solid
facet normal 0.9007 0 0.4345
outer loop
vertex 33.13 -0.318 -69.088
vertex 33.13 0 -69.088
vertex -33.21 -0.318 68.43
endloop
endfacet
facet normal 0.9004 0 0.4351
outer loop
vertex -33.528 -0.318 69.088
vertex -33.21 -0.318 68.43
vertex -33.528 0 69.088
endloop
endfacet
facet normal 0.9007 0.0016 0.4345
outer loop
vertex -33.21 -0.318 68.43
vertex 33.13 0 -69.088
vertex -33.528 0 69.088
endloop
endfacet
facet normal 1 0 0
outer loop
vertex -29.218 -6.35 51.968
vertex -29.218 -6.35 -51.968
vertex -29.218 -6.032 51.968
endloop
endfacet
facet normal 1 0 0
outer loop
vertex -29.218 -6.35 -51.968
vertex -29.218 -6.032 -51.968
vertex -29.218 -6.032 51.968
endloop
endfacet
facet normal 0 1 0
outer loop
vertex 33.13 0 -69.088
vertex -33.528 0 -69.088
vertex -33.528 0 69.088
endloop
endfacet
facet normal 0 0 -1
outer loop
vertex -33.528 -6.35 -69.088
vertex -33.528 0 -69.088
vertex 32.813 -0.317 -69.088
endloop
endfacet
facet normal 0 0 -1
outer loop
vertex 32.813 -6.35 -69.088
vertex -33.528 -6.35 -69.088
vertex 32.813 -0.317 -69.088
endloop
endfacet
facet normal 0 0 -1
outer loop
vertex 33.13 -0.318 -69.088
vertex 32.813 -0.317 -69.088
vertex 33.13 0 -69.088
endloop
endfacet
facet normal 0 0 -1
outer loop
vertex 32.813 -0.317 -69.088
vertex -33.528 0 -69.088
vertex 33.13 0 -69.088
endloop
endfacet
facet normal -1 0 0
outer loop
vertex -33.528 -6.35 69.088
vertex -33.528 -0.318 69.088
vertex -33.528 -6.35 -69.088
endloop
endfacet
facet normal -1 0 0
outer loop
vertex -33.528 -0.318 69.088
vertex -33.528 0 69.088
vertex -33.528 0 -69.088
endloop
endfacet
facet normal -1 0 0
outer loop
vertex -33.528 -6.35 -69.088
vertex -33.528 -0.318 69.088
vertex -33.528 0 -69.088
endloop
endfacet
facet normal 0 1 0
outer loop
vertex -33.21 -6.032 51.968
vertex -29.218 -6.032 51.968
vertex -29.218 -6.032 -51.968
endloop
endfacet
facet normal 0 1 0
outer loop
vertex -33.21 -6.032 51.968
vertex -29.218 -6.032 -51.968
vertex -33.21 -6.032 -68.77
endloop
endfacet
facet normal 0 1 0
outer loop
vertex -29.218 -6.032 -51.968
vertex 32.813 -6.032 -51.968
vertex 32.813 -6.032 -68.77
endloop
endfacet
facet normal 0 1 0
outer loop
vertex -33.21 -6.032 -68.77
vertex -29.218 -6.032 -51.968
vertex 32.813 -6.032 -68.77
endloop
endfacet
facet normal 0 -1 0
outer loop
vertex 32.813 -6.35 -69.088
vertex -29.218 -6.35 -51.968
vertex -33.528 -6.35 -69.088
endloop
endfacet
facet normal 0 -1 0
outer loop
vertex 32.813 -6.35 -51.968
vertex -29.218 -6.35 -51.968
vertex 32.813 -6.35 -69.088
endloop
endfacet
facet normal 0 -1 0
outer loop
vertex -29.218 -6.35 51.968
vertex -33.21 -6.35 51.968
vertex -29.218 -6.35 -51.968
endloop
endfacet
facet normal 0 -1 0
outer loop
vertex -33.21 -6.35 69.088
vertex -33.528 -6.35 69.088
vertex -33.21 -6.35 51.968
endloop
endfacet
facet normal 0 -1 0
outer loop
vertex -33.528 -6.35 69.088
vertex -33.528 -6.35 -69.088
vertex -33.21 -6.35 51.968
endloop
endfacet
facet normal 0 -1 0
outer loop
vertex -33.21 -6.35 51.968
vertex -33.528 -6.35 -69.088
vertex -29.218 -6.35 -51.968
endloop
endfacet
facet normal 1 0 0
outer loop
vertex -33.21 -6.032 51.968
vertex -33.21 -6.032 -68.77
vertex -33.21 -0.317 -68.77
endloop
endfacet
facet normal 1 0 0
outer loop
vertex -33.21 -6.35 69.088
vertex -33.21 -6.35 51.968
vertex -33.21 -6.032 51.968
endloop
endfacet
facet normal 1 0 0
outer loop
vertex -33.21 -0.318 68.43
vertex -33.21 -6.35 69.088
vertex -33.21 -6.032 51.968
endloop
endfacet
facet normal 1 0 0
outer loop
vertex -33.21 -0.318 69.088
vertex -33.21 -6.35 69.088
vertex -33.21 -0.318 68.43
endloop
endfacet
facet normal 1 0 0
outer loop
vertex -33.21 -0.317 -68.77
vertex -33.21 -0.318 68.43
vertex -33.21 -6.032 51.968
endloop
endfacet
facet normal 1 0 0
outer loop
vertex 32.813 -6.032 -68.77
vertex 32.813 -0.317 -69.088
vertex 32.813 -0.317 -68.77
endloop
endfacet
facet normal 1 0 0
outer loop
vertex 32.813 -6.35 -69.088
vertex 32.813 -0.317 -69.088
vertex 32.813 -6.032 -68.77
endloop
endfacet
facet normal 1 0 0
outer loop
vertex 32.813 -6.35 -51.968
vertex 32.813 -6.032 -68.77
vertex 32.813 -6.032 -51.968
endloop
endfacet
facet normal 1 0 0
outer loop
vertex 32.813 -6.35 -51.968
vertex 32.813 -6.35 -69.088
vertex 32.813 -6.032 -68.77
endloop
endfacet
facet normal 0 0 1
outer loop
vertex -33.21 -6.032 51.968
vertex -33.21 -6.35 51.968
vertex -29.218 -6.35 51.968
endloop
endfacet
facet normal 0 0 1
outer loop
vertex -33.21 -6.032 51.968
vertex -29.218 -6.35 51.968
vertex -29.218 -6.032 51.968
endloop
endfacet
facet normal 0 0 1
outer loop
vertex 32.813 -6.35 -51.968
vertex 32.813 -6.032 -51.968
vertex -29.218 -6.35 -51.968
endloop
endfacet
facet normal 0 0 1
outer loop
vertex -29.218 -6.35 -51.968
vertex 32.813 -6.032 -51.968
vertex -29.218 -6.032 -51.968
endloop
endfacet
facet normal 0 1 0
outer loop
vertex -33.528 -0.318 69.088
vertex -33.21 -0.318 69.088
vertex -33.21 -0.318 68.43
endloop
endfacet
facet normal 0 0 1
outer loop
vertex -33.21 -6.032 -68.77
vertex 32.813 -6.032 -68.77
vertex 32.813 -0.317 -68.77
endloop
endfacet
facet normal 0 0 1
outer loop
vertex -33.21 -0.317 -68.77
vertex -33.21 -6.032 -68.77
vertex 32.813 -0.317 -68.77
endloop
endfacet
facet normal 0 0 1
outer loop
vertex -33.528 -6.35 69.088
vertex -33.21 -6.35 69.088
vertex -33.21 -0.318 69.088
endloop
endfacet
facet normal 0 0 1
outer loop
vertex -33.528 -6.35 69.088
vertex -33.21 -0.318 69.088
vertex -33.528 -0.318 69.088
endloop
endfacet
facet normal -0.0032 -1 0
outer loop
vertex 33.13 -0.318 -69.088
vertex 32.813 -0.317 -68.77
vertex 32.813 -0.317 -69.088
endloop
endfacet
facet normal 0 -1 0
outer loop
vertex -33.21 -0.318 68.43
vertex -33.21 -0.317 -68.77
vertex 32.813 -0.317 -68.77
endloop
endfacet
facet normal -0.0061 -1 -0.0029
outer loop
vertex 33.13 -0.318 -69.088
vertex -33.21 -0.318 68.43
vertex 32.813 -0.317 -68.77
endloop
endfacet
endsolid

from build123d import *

# Parameters (mm, degrees)
F1_DEPTH  = 6.35
F2_W      = 5.715
F2_H      = 16.8021
F3_DEPTH  = 33.011516
F4_W      = 3.99288
F4_H      = 5.715
F5_DEPTH  = 68.7705
F6_W      = 0.3175
F6_H      = 138.176
F7_DEPTH  = 63.5
F9_DEPTH  = 25.4
F10_W     = 6.0325
F10_H     = 18.3896
F11_DEPTH = 67.49388
F13_DEPTH = 0.3175
F14_W     = 0.3175
F14_H     = 17.1196
F15_DEPTH = 6.0325


with BuildPart() as f1:
    # F0 (on Front) → F1 (new body)
    with BuildSketch(Plane.XZ):
        Polygon((-33.528, 69.088), (-33.528, -69.088), (33.130033, -69.088), (33.130033, -51.9684), (-29.21762, -51.9684), (-29.21762, 60.152978), (-29.21762, 69.088), align=None)
    extrude(amount=F1_DEPTH)

    # F2 (on Right) → F3 (cut, symmetric)
    with BuildSketch(Plane.YZ):
        with Locations((-3.175, 60.36945)):
            Rectangle(F2_W, F2_H)
        with Locations((-3.175, -60.36945)):
            Rectangle(F2_W, F2_H)
    extrude(amount=F3_DEPTH, both=True, mode=Mode.SUBTRACT)

    # F4 (on Top) → F5 (cut, symmetric)
    with BuildSketch(Plane.XY):
        with Locations((-31.21406, -3.175)):
            Rectangle(F4_W, F4_H)
    extrude(amount=F5_DEPTH, both=True, mode=Mode.SUBTRACT)

    # F6 (on face) → F7 (join)
    with BuildSketch(Plane.YZ.offset(-29.21762)):
        with Locations((-0.15875, 0)):
            Rectangle(F6_W, F6_H)
    extrude(amount=F7_DEPTH)

    # F8 (on face) → F9 (cut)
    with BuildSketch(Plane.YZ.offset(33.130033)):
        Polygon((-6.0325, -51.9684), (-6.0325, -68.7705), (-0.3175, -68.7705), (-0.3175, -52.373883), (-0.3175, -51.9684), align=None)
    extrude(amount=-F9_DEPTH, mode=Mode.SUBTRACT)

    # F10 (on face) → F11 (cut, through all)
    with BuildSketch(Plane.YZ.offset(-33.2105)):
        with Locations((-3.33375, 61.1632)):
            Rectangle(F10_W, F10_H)
    extrude(amount=F11_DEPTH, mode=Mode.SUBTRACT)

    # F12 (on face) → F13 (cut)
    with BuildSketch(Plane(origin=(0, 0, 0), x_dir=(-1, 0, 0), z_dir=(0, 1, 0))):
        Polygon((33.528, 69.088), (-34.28238, 69.088), (-34.28238, -69.088), (-33.130033, -69.088), align=None)
    extrude(amount=-F13_DEPTH, mode=Mode.SUBTRACT)

    # F14 (on face) → F15 (cut, through all)
    with BuildSketch(Plane.XZ.offset(6.35)):
        with Locations((32.971283, -60.5282)):
            Rectangle(F14_W, F14_H)
    extrude(amount=-F15_DEPTH, mode=Mode.SUBTRACT)


solid = f1.part
